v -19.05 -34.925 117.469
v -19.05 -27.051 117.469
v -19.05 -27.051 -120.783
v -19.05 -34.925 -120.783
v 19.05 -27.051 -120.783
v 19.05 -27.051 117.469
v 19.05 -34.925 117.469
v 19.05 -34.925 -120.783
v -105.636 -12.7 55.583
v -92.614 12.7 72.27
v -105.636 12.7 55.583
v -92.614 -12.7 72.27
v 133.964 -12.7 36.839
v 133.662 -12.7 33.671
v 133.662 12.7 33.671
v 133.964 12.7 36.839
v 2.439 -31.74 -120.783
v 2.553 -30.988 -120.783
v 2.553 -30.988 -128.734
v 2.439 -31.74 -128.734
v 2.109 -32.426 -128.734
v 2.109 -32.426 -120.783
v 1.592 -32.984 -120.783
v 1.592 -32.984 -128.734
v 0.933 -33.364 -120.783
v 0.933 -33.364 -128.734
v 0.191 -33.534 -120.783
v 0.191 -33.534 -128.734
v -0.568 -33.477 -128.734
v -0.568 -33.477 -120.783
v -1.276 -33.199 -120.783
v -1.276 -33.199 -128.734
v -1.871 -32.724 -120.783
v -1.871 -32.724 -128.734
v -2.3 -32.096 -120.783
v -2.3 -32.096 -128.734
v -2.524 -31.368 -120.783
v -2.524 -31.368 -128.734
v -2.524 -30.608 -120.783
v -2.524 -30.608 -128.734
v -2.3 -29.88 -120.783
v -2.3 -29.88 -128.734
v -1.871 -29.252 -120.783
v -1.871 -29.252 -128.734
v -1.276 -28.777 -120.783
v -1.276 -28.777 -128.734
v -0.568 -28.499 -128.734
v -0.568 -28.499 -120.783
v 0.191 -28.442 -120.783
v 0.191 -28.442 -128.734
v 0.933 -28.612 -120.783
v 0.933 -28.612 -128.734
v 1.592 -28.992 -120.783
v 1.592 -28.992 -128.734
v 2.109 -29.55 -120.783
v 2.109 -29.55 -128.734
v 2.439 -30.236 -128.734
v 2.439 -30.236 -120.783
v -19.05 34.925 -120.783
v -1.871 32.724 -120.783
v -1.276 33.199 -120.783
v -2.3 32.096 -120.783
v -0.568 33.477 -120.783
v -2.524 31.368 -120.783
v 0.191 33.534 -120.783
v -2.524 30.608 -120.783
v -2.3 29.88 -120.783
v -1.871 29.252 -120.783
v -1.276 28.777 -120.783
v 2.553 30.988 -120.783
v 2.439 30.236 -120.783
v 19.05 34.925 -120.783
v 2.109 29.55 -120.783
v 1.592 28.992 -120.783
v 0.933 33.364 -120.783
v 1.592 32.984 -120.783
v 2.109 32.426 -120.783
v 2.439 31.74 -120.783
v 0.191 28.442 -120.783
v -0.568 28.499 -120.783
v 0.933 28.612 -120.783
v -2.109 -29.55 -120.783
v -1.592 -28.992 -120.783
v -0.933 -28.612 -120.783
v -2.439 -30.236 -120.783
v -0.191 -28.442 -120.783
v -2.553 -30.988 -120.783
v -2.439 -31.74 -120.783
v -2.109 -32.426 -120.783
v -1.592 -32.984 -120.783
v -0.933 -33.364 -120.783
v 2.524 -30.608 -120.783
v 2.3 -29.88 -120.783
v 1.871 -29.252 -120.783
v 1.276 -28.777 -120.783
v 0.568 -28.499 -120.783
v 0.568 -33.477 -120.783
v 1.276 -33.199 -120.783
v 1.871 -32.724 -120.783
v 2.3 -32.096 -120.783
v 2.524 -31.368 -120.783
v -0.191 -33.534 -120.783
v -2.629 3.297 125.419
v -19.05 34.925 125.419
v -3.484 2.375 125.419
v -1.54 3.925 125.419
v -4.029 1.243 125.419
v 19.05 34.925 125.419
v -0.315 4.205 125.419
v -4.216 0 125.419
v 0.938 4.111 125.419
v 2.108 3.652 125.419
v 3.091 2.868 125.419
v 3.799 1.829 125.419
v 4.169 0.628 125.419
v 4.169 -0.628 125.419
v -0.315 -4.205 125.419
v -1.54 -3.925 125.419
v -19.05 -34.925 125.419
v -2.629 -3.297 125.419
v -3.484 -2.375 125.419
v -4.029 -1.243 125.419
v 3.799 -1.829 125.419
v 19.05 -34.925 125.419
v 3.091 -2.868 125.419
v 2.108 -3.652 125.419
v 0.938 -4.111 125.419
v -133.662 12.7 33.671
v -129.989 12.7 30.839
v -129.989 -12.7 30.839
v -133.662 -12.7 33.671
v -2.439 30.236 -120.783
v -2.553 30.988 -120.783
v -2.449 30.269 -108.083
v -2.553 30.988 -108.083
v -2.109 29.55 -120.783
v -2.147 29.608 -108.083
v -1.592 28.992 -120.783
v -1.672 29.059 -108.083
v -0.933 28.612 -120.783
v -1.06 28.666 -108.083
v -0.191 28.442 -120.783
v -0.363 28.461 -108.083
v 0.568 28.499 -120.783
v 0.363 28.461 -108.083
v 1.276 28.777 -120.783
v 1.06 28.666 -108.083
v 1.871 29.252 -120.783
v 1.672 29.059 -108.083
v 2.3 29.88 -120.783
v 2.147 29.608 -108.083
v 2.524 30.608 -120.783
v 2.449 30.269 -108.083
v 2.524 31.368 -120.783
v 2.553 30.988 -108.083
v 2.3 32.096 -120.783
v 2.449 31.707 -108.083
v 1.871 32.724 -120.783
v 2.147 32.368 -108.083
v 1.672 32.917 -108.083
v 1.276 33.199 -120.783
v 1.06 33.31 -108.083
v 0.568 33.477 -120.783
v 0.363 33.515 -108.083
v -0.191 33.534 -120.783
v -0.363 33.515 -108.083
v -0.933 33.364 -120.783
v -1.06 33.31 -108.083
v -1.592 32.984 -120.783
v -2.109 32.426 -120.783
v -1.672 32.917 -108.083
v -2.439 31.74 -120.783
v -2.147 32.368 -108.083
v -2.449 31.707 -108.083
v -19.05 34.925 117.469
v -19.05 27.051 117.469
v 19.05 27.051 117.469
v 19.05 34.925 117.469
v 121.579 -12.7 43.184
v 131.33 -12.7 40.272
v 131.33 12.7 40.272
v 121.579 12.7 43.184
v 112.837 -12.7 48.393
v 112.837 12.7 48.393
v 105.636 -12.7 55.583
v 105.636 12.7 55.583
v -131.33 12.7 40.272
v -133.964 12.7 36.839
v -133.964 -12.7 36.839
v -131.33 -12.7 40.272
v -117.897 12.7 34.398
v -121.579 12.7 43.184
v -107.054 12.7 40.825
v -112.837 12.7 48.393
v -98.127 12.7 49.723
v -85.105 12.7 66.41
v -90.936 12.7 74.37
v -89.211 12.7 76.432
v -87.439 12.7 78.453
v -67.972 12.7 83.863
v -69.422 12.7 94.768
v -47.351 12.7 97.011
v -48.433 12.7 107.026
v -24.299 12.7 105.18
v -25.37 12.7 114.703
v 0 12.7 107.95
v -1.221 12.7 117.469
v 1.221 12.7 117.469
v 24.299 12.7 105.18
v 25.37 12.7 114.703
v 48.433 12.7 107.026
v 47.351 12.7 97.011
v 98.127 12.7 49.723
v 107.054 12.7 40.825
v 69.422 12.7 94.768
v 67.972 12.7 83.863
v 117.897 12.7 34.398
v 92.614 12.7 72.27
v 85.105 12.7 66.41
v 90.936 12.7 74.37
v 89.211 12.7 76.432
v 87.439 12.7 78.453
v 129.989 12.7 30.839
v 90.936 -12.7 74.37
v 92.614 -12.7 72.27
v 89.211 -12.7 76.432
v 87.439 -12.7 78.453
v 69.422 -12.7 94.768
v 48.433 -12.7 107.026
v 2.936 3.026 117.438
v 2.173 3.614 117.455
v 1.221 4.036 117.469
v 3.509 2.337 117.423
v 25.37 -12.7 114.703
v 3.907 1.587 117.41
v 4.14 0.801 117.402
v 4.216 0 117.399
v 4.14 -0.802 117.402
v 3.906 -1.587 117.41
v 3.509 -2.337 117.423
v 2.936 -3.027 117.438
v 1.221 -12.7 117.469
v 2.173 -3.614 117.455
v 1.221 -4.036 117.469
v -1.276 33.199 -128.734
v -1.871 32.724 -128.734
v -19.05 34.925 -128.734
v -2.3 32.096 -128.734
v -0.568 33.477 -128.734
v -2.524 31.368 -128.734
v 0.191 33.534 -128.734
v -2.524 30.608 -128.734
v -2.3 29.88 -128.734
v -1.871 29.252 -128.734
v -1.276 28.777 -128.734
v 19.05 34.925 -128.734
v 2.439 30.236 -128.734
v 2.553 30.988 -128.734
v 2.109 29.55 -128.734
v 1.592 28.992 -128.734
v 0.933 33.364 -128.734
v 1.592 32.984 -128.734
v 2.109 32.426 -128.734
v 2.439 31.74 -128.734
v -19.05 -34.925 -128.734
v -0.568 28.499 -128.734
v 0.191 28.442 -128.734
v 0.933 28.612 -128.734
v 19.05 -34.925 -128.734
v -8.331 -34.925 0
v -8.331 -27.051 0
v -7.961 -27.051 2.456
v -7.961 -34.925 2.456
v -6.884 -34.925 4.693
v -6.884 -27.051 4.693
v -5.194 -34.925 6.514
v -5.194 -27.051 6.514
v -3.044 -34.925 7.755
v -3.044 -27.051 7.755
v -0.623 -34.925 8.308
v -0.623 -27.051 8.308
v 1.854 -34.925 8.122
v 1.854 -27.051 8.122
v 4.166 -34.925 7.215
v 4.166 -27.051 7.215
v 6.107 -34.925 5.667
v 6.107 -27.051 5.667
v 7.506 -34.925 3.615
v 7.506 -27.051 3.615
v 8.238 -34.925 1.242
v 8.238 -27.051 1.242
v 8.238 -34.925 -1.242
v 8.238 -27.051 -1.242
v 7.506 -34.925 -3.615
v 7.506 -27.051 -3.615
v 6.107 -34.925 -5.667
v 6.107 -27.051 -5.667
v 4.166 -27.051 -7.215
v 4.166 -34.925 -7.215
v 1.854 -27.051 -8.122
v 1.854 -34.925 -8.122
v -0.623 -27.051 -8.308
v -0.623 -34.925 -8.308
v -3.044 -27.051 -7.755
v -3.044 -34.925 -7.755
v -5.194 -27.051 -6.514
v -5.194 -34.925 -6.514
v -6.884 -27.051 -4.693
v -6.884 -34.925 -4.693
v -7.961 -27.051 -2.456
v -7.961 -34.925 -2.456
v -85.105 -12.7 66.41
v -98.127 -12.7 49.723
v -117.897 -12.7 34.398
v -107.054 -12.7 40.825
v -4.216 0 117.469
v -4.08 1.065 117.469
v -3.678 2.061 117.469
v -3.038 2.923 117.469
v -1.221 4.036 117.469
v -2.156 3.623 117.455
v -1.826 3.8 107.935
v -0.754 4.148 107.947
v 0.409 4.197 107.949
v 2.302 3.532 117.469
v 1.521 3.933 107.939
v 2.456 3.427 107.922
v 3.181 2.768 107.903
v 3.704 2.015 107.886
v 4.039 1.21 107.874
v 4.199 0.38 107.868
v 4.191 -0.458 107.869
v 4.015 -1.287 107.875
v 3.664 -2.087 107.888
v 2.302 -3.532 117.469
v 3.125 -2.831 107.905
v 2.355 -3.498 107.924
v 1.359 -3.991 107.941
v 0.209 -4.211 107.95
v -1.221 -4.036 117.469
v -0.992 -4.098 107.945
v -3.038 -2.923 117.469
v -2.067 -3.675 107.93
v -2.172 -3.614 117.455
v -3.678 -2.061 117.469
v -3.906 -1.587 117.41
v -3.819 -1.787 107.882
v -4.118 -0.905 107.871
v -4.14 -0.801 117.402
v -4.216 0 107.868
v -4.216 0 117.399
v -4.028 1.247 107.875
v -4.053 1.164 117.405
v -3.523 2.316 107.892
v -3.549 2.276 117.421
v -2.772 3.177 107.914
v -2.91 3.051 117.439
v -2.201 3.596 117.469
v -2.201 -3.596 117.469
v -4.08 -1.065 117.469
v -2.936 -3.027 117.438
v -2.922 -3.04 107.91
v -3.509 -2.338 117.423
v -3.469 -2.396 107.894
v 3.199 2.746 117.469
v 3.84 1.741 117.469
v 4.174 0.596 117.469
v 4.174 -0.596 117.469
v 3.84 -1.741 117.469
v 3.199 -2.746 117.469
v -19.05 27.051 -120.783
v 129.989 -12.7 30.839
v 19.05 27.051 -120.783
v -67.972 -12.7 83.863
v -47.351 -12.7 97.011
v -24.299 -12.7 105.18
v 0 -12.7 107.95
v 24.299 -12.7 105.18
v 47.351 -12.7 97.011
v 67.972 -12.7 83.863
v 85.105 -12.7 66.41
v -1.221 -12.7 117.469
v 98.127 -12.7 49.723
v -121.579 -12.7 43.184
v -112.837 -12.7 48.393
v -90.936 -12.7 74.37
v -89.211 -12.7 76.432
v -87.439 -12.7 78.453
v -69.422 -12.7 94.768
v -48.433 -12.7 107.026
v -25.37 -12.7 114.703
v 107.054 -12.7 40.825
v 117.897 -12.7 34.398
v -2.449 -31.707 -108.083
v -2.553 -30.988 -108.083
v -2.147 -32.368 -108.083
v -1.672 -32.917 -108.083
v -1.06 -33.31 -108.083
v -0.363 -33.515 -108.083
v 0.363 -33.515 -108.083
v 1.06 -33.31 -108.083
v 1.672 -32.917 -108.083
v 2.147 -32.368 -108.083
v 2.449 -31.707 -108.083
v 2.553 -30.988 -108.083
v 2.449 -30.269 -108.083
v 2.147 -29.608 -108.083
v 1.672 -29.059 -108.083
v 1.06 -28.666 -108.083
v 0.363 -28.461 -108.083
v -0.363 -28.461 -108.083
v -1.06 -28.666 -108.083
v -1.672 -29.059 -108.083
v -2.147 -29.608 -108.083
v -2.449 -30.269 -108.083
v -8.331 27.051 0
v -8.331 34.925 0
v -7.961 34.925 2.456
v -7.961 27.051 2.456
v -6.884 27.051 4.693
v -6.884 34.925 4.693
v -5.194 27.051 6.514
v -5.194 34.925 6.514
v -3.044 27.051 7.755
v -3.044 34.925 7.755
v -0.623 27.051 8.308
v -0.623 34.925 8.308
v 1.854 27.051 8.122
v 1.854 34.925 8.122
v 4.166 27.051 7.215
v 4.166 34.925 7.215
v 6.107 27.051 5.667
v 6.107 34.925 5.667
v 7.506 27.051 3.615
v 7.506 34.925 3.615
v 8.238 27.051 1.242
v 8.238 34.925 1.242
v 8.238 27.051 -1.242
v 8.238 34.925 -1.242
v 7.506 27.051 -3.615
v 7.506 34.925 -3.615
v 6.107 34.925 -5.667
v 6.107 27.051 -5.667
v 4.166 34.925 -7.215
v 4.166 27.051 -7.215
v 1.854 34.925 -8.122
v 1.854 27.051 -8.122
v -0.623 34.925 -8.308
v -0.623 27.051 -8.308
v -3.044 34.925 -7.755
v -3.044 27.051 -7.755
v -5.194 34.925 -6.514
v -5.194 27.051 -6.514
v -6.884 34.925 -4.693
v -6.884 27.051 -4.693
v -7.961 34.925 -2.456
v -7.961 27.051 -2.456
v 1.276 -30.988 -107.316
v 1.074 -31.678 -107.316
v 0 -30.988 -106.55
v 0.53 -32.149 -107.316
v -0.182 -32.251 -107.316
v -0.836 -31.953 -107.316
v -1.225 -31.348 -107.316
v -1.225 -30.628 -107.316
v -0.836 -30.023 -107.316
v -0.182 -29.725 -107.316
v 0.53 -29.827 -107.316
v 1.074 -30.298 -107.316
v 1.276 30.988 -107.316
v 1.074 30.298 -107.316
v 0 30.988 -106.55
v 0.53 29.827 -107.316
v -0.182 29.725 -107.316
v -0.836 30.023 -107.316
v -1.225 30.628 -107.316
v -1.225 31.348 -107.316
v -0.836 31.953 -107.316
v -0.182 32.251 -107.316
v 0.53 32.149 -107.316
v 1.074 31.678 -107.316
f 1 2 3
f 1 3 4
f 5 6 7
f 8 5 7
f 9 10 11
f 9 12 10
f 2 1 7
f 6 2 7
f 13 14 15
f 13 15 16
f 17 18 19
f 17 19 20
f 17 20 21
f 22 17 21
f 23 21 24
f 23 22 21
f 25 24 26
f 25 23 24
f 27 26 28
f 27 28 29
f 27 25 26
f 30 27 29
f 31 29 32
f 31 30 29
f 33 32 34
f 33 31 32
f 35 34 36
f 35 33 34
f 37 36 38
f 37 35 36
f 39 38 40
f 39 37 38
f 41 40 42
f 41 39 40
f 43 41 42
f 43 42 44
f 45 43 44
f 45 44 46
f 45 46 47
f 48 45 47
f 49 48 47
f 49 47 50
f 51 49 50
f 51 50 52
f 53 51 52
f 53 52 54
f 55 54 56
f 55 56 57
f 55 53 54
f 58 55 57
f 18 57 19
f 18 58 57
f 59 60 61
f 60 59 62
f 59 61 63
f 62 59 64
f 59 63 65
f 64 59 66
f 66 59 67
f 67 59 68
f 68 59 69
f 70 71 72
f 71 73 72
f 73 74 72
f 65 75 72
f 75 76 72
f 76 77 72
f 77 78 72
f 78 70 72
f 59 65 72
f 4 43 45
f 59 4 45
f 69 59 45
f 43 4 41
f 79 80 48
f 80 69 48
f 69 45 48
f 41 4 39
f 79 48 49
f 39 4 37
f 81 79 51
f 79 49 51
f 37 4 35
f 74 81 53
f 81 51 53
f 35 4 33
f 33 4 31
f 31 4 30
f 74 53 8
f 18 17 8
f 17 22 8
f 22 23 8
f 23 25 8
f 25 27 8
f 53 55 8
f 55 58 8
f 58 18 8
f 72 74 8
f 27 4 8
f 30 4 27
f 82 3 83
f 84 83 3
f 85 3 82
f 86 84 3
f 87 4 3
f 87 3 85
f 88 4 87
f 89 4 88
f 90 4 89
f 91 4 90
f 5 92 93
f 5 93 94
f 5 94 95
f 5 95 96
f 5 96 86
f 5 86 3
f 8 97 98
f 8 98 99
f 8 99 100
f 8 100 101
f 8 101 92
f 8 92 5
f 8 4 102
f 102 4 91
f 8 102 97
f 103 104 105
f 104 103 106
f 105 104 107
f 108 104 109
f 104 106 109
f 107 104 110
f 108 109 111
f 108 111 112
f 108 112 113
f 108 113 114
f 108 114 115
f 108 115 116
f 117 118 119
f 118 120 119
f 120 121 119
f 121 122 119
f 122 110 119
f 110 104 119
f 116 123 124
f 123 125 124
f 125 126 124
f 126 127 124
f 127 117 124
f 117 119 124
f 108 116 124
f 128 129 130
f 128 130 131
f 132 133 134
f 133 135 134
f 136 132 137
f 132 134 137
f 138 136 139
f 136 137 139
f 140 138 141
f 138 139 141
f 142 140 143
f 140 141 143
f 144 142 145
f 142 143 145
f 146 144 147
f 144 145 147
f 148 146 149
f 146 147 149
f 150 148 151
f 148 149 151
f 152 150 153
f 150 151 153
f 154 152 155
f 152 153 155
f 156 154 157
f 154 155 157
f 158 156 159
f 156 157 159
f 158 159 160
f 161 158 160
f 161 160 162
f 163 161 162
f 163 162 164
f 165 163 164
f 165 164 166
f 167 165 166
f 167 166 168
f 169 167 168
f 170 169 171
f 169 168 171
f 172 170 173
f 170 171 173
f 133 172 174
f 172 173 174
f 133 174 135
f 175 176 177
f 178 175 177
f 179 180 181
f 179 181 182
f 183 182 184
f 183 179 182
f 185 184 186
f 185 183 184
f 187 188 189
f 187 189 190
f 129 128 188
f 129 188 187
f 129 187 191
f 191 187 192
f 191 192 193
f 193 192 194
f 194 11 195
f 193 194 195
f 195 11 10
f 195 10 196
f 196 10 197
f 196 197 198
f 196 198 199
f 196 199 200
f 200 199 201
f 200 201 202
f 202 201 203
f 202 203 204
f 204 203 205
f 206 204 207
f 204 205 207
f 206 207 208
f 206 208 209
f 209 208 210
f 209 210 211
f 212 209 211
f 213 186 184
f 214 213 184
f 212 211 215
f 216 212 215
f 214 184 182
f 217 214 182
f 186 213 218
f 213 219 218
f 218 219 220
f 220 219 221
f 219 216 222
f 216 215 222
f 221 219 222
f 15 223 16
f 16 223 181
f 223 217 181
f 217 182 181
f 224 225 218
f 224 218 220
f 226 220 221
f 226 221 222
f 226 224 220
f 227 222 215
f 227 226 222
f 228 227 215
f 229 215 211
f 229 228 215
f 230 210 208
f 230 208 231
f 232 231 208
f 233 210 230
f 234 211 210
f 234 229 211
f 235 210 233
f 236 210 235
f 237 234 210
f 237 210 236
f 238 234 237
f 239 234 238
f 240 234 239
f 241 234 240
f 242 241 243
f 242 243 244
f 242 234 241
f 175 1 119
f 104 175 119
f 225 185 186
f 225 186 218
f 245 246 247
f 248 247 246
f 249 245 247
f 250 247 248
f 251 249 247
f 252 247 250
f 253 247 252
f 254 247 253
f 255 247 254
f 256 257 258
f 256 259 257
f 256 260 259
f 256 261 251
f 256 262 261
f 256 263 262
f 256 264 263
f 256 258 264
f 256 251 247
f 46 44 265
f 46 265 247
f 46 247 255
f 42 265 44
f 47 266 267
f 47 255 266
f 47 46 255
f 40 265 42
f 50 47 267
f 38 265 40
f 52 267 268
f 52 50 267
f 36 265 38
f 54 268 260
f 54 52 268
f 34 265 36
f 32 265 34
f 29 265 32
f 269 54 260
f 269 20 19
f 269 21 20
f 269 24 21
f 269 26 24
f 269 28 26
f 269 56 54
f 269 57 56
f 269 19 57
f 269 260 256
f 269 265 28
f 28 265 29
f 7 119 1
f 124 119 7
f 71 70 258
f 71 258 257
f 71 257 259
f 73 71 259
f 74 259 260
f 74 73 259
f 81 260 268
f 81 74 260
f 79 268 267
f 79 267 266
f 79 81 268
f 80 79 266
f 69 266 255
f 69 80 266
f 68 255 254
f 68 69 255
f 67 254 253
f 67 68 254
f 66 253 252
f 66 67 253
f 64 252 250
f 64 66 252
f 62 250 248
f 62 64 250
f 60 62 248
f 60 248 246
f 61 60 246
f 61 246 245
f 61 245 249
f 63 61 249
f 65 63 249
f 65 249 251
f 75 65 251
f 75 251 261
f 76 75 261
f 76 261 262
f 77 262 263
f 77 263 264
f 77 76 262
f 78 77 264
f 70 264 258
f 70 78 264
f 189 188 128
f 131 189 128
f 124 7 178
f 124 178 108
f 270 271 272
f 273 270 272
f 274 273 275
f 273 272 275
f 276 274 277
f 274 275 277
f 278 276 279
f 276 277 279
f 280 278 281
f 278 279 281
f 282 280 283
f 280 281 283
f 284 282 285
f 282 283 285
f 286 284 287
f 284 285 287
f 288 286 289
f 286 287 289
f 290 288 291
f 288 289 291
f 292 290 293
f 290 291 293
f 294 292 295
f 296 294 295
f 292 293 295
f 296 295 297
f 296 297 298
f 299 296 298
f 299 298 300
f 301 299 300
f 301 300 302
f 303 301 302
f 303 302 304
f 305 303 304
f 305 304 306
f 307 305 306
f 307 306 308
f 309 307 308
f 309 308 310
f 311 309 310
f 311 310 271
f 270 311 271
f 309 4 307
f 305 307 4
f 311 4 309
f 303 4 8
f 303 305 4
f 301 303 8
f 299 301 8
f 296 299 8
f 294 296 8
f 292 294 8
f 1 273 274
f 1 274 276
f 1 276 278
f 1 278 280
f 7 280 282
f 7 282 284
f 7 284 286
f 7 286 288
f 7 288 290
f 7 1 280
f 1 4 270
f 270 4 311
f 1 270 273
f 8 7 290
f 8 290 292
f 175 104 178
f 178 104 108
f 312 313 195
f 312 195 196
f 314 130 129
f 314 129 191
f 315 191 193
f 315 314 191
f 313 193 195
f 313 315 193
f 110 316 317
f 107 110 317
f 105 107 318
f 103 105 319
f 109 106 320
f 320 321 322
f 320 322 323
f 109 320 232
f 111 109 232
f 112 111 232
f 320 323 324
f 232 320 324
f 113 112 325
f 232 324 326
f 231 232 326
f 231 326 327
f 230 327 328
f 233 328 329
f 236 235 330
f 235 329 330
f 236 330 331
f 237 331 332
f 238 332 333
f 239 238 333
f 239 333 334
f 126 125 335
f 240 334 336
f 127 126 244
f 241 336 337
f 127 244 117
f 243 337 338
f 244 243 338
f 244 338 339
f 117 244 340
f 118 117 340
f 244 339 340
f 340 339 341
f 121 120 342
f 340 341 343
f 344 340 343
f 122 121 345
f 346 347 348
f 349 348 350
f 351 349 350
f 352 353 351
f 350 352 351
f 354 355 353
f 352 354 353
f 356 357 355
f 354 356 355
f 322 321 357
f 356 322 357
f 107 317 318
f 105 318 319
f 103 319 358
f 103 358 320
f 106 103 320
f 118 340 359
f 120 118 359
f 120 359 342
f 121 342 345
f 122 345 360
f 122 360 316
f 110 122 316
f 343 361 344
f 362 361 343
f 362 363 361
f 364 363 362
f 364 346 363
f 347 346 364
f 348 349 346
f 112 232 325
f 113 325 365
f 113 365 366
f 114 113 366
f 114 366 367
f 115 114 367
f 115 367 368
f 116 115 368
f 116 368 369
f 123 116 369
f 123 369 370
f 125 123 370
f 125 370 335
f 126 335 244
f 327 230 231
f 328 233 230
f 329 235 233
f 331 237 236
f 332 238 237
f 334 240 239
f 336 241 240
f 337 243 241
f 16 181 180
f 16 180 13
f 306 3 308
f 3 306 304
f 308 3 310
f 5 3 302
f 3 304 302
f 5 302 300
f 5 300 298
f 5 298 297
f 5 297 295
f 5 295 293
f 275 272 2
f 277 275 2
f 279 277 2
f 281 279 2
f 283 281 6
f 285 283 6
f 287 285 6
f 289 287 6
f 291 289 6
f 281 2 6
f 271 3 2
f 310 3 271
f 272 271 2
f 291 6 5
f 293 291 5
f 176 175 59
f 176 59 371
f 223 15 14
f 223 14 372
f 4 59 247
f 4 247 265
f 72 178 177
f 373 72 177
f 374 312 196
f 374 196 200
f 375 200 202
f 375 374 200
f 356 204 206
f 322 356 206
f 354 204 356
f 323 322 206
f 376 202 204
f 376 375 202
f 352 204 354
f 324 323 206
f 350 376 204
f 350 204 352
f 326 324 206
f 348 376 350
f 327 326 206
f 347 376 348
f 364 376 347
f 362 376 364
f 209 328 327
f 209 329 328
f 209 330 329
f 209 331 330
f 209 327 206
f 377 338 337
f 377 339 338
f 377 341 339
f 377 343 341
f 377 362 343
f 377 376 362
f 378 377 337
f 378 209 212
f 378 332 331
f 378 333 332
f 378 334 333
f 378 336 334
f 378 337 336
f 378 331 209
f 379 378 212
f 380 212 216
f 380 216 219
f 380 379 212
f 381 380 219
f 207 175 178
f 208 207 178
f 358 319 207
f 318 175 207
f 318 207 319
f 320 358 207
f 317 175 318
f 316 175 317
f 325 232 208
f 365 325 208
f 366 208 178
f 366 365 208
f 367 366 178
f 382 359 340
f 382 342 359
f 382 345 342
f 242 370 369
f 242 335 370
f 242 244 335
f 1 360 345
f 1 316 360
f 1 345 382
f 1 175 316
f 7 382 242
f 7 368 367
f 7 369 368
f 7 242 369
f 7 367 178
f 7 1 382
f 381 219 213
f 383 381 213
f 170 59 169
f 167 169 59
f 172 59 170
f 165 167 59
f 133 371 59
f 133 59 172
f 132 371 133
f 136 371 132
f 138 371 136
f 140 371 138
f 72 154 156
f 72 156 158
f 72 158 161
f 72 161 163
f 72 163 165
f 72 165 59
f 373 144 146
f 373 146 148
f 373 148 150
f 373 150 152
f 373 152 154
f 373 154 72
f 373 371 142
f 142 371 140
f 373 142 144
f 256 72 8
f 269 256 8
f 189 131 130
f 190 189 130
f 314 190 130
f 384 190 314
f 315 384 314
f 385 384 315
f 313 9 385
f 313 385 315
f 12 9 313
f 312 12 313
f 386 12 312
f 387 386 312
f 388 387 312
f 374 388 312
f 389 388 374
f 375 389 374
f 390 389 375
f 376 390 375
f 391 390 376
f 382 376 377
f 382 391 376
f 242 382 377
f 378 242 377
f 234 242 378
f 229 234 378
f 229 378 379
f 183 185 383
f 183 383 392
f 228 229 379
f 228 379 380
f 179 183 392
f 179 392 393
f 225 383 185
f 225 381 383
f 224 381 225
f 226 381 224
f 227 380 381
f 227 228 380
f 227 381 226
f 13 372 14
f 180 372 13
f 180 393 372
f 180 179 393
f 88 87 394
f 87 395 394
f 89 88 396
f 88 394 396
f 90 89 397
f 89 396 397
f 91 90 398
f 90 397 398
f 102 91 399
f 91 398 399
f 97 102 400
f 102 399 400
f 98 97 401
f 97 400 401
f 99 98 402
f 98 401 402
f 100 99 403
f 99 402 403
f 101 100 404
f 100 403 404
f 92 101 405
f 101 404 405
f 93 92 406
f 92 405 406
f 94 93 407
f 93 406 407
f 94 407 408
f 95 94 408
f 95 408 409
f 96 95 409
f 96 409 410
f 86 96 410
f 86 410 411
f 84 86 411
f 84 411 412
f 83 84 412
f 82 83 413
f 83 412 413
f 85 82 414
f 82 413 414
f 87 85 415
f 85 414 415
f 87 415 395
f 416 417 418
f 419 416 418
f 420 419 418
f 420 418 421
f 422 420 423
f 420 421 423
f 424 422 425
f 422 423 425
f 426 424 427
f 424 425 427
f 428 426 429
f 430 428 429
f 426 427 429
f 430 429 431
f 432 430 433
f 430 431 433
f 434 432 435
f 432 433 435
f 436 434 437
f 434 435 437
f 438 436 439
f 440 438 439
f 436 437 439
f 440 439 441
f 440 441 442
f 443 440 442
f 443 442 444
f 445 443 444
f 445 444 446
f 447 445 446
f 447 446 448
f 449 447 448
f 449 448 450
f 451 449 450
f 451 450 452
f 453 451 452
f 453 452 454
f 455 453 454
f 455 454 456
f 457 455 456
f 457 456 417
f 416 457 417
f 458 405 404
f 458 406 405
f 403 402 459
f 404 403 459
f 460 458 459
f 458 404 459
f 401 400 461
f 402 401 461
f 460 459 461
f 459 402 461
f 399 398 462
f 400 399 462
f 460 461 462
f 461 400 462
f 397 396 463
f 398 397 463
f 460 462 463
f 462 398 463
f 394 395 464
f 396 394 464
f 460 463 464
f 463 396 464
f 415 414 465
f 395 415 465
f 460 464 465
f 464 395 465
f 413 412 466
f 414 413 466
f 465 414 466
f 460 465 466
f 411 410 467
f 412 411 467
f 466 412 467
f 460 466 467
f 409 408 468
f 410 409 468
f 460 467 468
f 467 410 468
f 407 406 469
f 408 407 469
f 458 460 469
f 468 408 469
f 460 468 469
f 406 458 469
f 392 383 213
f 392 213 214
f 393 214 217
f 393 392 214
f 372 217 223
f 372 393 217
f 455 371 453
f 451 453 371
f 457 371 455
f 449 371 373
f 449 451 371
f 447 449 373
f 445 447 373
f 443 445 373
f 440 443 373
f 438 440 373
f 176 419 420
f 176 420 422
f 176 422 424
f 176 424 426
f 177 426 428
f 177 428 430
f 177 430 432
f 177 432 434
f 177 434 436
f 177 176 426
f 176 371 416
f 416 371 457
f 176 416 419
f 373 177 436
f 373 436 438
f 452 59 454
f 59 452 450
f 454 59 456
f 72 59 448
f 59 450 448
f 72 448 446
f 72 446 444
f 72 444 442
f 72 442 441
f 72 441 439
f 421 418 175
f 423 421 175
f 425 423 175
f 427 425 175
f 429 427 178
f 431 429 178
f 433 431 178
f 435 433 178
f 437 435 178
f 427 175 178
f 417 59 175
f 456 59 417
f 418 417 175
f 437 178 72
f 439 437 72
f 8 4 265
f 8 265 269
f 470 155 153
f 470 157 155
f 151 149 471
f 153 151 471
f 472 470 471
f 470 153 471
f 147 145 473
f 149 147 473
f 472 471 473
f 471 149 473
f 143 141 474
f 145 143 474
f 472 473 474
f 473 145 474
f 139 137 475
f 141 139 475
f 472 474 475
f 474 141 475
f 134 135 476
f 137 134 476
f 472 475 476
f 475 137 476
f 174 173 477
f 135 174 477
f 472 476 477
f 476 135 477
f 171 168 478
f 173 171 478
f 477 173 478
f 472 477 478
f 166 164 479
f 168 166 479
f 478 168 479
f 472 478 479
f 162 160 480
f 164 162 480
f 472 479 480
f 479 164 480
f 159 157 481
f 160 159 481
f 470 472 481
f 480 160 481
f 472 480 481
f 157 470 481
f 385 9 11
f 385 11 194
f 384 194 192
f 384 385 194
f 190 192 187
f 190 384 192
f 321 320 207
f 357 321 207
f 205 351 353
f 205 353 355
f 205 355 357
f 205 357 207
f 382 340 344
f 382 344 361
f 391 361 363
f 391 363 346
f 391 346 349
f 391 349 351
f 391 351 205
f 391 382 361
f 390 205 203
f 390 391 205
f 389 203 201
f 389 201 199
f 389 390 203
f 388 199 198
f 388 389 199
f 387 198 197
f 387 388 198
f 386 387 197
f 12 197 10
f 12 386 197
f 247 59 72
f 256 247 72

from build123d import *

# Parameters (mm, degrees)
F1_DEPTH    = 12.7
F2_T1_DEPTH = 41.1780168926
F2_T3_DEPTH = 42.797567125
F3_W        = 38.1
F3_H        = 7.9502
F4_DEPTH    = 34.925
F5_W        = 38.1
F5_H        = 7.874
F6_DEPTH    = 238.252
F8_D        = 16.6624
F8_2_D      = 16.6624
F10_D       = 5.1054
F10_DEPTH   = 12.7
F10_TIP     = 1.5338169022
F10_2_D     = 5.1054
F10_2_DEPTH = 12.7
F10_2_TIP   = 1.5338169022
F12_D       = 8.4328
F12_DEPTH   = 27.305
F12_TIP     = 2.5334687141
F13_W       = 38.1
F13_H       = 69.85
F13_R       = 2.5527
F14_DEPTH   = 7.9502


# Not quite as in the source:
# - a fillet or chamfer that OpenCascade refuses, or shapes differently, is made with other operations: its cross-section is extruded or revolved along the edge and cut away or added


with BuildPart() as f1:
    # F0 (on Front) → F1 (new body, symmetric)
    with BuildSketch(Plane.XZ):
        with BuildLine():
            Line((-134.254875, 39.8868755789), (-133.35, 30.4049545586))
            ThreePointArc((-133.35, 30.4049545586), (-113.74755339, 36.4343087177), (-98.1266094704, 49.7232189715))
            Line((-98.1266094704, 49.7232189715), (-85.1049548754, 66.4104596856))
            ThreePointArc((-85.1049548754, 66.4104596856), (0, 107.95), (85.1049548754, 66.4104596856))
            Line((85.1049548754, 66.4104596856), (98.1266094704, 49.7232189715))
            ThreePointArc((98.1266094704, 49.7232189715), (113.74755339, 36.4343087177), (133.35, 30.4049545586))
            Line((133.35, 30.4049545586), (134.254875, 39.8868755789))
            ThreePointArc((134.254875, 39.8868755789), (118.3278871294, 44.7857258331), (105.6358701947, 55.5829654143))
            Line((105.6358701947, 55.5829654143), (92.6142155997, 72.2702061284))
            ThreePointArc((92.6142155997, 72.2702061284), (90.0794962204, 75.4059678386), (87.4386569195, 78.4528960658))
            ThreePointArc((87.4386569195, 78.4528960658), (0, 117.475), (-87.4386569195, 78.4528960658))
            ThreePointArc((-87.4386569195, 78.4528960658), (-90.0794962204, 75.4059678386), (-92.6142155997, 72.2702061284))
            Line((-92.6142155997, 72.2702061284), (-105.6358701947, 55.5829654143))
            ThreePointArc((-105.6358701947, 55.5829654143), (-118.3278871294, 44.7857258331), (-134.254875, 39.8868755789))
        make_face()
    extrude(amount=F1_DEPTH, both=True)

    # F2: chamfer of 3.175 on 4 edges, made by hand

    # F2_s2 → F2_t1 (cut)
    with BuildSketch(Plane.XZ.offset(-20.5890084463)):
        with BuildLine():
            Line((131.3300103455, 40.2719071277), (133.9640360968, 36.839259599))
            Line((133.9640360968, 36.839259599), (134.254875, 39.8868755789))
            ThreePointArc((134.254875, 39.8868755789), (132.7444106107, 40.0591461616), (131.3300103455, 40.2719071277))
        make_face()
        with BuildLine():
            Line((-133.9640360968, 36.839259599), (-131.3300103455, 40.2719071277))
            ThreePointArc((-131.3300103455, 40.2719071277), (-132.7444106107, 40.0591461616), (-134.254875, 39.8868755789))
            Line((-134.254875, 39.8868755789), (-133.9640360968, 36.839259599))
        make_face()
    extrude(amount=F2_T1_DEPTH, mode=Mode.SUBTRACT)

    # F2_s4 → F2_t3 (cut)
    with BuildSketch(Plane.XZ.offset(-21.3987835625)):
        with BuildLine():
            Line((133.6616903629, 33.6710668983), (129.989386691, 30.8391913582))
            ThreePointArc((129.989386691, 30.8391913582), (131.6215577531, 30.5998162612), (133.35, 30.4049545586))
            Line((133.35, 30.4049545586), (133.6616903629, 33.6710668983))
        make_face()
        with BuildLine():
            Line((-129.989386691, 30.8391913582), (-133.6616903629, 33.6710668983))
            Line((-133.6616903629, 33.6710668983), (-133.35, 30.4049545586))
            ThreePointArc((-133.35, 30.4049545586), (-131.6215577531, 30.5998162612), (-129.989386691, 30.8391913582))
        make_face()
    extrude(amount=F2_T3_DEPTH, mode=Mode.SUBTRACT)

    # F3 (on Front) → F4 (join, symmetric)
    with BuildSketch(Plane.XZ):
        with Locations((0, 121.44375)):
            Rectangle(F3_W, F3_H)
    extrude(amount=F4_DEPTH, both=True)

    # F12
    with Locations(Plane.XY.offset(125.41885)):
        with Locations((0, 0)):
            Hole(F12_D / 2, depth=F12_DEPTH)
            with Locations((0, 0, -(F12_DEPTH + F12_TIP / 2))):  # 118° drill point
                Cone(0, F12_D / 2, F12_TIP, mode=Mode.SUBTRACT)


with BuildPart() as f6:
    # F5 (on face) → F6 (new body)
    with BuildSketch(Plane(origin=(0, 0, 117.46865), x_dir=(1, 0, 0), z_dir=(0, 0, -1))):
        with Locations((0, 30.988)):
            Rectangle(F5_W, F5_H)
    extrude(amount=F6_DEPTH)

    # F8 (through all)
    with Locations(Plane.XZ.offset(34.925)):
        with Locations((0, 0)):
            Hole(F8_D / 2)

    # F10
    with Locations(Plane(origin=(0, 0, -120.78335), x_dir=(1, 0, 0), z_dir=(0, 0, -1))):
        with Locations((0, 30.988), (0, -30.988)):
            Hole(F10_D / 2, depth=F10_DEPTH)
            with Locations((0, 0, -(F10_DEPTH + F10_TIP / 2))):  # 118° drill point
                Cone(0, F10_D / 2, F10_TIP, mode=Mode.SUBTRACT)


with BuildPart() as f6b:
    # F5 (on face) → F6, piece 2 (new body)
    with BuildSketch(Plane(origin=(0, 0, 117.46865), x_dir=(1, 0, 0), z_dir=(0, 0, -1))):
        with Locations((0, -30.988)):
            Rectangle(F5_W, F5_H)
    extrude(amount=F6_DEPTH)

    # F8#2 (through all)
    with Locations(Plane.XZ.offset(34.925)):
        with Locations((0, 0)):
            Hole(F8_2_D / 2)

    # F10#2
    with Locations(Plane(origin=(0, 0, -120.78335), x_dir=(1, 0, 0), z_dir=(0, 0, -1))):
        with Locations((0, 30.988), (0, -30.988)):
            Hole(F10_2_D / 2, depth=F10_2_DEPTH)
            with Locations((0, 0, -(F10_2_DEPTH + F10_2_TIP / 2))):  # 118° drill point
                Cone(0, F10_2_D / 2, F10_2_TIP, mode=Mode.SUBTRACT)


with BuildPart() as f14:
    # F13 (on face) → F14 (new body)
    with BuildSketch(Plane(origin=(0, 0, -120.78335), x_dir=(1, 0, 0), z_dir=(0, 0, -1))):
        Rectangle(F13_W, F13_H)
        with Locations((0, -30.988)):
            Circle(F13_R, mode=Mode.SUBTRACT)
        with Locations((0, 30.988)):
            Circle(F13_R, mode=Mode.SUBTRACT)
    extrude(amount=F14_DEPTH)


solid = Compound([f1.part, f6.part, f6b.part, f14.part])
